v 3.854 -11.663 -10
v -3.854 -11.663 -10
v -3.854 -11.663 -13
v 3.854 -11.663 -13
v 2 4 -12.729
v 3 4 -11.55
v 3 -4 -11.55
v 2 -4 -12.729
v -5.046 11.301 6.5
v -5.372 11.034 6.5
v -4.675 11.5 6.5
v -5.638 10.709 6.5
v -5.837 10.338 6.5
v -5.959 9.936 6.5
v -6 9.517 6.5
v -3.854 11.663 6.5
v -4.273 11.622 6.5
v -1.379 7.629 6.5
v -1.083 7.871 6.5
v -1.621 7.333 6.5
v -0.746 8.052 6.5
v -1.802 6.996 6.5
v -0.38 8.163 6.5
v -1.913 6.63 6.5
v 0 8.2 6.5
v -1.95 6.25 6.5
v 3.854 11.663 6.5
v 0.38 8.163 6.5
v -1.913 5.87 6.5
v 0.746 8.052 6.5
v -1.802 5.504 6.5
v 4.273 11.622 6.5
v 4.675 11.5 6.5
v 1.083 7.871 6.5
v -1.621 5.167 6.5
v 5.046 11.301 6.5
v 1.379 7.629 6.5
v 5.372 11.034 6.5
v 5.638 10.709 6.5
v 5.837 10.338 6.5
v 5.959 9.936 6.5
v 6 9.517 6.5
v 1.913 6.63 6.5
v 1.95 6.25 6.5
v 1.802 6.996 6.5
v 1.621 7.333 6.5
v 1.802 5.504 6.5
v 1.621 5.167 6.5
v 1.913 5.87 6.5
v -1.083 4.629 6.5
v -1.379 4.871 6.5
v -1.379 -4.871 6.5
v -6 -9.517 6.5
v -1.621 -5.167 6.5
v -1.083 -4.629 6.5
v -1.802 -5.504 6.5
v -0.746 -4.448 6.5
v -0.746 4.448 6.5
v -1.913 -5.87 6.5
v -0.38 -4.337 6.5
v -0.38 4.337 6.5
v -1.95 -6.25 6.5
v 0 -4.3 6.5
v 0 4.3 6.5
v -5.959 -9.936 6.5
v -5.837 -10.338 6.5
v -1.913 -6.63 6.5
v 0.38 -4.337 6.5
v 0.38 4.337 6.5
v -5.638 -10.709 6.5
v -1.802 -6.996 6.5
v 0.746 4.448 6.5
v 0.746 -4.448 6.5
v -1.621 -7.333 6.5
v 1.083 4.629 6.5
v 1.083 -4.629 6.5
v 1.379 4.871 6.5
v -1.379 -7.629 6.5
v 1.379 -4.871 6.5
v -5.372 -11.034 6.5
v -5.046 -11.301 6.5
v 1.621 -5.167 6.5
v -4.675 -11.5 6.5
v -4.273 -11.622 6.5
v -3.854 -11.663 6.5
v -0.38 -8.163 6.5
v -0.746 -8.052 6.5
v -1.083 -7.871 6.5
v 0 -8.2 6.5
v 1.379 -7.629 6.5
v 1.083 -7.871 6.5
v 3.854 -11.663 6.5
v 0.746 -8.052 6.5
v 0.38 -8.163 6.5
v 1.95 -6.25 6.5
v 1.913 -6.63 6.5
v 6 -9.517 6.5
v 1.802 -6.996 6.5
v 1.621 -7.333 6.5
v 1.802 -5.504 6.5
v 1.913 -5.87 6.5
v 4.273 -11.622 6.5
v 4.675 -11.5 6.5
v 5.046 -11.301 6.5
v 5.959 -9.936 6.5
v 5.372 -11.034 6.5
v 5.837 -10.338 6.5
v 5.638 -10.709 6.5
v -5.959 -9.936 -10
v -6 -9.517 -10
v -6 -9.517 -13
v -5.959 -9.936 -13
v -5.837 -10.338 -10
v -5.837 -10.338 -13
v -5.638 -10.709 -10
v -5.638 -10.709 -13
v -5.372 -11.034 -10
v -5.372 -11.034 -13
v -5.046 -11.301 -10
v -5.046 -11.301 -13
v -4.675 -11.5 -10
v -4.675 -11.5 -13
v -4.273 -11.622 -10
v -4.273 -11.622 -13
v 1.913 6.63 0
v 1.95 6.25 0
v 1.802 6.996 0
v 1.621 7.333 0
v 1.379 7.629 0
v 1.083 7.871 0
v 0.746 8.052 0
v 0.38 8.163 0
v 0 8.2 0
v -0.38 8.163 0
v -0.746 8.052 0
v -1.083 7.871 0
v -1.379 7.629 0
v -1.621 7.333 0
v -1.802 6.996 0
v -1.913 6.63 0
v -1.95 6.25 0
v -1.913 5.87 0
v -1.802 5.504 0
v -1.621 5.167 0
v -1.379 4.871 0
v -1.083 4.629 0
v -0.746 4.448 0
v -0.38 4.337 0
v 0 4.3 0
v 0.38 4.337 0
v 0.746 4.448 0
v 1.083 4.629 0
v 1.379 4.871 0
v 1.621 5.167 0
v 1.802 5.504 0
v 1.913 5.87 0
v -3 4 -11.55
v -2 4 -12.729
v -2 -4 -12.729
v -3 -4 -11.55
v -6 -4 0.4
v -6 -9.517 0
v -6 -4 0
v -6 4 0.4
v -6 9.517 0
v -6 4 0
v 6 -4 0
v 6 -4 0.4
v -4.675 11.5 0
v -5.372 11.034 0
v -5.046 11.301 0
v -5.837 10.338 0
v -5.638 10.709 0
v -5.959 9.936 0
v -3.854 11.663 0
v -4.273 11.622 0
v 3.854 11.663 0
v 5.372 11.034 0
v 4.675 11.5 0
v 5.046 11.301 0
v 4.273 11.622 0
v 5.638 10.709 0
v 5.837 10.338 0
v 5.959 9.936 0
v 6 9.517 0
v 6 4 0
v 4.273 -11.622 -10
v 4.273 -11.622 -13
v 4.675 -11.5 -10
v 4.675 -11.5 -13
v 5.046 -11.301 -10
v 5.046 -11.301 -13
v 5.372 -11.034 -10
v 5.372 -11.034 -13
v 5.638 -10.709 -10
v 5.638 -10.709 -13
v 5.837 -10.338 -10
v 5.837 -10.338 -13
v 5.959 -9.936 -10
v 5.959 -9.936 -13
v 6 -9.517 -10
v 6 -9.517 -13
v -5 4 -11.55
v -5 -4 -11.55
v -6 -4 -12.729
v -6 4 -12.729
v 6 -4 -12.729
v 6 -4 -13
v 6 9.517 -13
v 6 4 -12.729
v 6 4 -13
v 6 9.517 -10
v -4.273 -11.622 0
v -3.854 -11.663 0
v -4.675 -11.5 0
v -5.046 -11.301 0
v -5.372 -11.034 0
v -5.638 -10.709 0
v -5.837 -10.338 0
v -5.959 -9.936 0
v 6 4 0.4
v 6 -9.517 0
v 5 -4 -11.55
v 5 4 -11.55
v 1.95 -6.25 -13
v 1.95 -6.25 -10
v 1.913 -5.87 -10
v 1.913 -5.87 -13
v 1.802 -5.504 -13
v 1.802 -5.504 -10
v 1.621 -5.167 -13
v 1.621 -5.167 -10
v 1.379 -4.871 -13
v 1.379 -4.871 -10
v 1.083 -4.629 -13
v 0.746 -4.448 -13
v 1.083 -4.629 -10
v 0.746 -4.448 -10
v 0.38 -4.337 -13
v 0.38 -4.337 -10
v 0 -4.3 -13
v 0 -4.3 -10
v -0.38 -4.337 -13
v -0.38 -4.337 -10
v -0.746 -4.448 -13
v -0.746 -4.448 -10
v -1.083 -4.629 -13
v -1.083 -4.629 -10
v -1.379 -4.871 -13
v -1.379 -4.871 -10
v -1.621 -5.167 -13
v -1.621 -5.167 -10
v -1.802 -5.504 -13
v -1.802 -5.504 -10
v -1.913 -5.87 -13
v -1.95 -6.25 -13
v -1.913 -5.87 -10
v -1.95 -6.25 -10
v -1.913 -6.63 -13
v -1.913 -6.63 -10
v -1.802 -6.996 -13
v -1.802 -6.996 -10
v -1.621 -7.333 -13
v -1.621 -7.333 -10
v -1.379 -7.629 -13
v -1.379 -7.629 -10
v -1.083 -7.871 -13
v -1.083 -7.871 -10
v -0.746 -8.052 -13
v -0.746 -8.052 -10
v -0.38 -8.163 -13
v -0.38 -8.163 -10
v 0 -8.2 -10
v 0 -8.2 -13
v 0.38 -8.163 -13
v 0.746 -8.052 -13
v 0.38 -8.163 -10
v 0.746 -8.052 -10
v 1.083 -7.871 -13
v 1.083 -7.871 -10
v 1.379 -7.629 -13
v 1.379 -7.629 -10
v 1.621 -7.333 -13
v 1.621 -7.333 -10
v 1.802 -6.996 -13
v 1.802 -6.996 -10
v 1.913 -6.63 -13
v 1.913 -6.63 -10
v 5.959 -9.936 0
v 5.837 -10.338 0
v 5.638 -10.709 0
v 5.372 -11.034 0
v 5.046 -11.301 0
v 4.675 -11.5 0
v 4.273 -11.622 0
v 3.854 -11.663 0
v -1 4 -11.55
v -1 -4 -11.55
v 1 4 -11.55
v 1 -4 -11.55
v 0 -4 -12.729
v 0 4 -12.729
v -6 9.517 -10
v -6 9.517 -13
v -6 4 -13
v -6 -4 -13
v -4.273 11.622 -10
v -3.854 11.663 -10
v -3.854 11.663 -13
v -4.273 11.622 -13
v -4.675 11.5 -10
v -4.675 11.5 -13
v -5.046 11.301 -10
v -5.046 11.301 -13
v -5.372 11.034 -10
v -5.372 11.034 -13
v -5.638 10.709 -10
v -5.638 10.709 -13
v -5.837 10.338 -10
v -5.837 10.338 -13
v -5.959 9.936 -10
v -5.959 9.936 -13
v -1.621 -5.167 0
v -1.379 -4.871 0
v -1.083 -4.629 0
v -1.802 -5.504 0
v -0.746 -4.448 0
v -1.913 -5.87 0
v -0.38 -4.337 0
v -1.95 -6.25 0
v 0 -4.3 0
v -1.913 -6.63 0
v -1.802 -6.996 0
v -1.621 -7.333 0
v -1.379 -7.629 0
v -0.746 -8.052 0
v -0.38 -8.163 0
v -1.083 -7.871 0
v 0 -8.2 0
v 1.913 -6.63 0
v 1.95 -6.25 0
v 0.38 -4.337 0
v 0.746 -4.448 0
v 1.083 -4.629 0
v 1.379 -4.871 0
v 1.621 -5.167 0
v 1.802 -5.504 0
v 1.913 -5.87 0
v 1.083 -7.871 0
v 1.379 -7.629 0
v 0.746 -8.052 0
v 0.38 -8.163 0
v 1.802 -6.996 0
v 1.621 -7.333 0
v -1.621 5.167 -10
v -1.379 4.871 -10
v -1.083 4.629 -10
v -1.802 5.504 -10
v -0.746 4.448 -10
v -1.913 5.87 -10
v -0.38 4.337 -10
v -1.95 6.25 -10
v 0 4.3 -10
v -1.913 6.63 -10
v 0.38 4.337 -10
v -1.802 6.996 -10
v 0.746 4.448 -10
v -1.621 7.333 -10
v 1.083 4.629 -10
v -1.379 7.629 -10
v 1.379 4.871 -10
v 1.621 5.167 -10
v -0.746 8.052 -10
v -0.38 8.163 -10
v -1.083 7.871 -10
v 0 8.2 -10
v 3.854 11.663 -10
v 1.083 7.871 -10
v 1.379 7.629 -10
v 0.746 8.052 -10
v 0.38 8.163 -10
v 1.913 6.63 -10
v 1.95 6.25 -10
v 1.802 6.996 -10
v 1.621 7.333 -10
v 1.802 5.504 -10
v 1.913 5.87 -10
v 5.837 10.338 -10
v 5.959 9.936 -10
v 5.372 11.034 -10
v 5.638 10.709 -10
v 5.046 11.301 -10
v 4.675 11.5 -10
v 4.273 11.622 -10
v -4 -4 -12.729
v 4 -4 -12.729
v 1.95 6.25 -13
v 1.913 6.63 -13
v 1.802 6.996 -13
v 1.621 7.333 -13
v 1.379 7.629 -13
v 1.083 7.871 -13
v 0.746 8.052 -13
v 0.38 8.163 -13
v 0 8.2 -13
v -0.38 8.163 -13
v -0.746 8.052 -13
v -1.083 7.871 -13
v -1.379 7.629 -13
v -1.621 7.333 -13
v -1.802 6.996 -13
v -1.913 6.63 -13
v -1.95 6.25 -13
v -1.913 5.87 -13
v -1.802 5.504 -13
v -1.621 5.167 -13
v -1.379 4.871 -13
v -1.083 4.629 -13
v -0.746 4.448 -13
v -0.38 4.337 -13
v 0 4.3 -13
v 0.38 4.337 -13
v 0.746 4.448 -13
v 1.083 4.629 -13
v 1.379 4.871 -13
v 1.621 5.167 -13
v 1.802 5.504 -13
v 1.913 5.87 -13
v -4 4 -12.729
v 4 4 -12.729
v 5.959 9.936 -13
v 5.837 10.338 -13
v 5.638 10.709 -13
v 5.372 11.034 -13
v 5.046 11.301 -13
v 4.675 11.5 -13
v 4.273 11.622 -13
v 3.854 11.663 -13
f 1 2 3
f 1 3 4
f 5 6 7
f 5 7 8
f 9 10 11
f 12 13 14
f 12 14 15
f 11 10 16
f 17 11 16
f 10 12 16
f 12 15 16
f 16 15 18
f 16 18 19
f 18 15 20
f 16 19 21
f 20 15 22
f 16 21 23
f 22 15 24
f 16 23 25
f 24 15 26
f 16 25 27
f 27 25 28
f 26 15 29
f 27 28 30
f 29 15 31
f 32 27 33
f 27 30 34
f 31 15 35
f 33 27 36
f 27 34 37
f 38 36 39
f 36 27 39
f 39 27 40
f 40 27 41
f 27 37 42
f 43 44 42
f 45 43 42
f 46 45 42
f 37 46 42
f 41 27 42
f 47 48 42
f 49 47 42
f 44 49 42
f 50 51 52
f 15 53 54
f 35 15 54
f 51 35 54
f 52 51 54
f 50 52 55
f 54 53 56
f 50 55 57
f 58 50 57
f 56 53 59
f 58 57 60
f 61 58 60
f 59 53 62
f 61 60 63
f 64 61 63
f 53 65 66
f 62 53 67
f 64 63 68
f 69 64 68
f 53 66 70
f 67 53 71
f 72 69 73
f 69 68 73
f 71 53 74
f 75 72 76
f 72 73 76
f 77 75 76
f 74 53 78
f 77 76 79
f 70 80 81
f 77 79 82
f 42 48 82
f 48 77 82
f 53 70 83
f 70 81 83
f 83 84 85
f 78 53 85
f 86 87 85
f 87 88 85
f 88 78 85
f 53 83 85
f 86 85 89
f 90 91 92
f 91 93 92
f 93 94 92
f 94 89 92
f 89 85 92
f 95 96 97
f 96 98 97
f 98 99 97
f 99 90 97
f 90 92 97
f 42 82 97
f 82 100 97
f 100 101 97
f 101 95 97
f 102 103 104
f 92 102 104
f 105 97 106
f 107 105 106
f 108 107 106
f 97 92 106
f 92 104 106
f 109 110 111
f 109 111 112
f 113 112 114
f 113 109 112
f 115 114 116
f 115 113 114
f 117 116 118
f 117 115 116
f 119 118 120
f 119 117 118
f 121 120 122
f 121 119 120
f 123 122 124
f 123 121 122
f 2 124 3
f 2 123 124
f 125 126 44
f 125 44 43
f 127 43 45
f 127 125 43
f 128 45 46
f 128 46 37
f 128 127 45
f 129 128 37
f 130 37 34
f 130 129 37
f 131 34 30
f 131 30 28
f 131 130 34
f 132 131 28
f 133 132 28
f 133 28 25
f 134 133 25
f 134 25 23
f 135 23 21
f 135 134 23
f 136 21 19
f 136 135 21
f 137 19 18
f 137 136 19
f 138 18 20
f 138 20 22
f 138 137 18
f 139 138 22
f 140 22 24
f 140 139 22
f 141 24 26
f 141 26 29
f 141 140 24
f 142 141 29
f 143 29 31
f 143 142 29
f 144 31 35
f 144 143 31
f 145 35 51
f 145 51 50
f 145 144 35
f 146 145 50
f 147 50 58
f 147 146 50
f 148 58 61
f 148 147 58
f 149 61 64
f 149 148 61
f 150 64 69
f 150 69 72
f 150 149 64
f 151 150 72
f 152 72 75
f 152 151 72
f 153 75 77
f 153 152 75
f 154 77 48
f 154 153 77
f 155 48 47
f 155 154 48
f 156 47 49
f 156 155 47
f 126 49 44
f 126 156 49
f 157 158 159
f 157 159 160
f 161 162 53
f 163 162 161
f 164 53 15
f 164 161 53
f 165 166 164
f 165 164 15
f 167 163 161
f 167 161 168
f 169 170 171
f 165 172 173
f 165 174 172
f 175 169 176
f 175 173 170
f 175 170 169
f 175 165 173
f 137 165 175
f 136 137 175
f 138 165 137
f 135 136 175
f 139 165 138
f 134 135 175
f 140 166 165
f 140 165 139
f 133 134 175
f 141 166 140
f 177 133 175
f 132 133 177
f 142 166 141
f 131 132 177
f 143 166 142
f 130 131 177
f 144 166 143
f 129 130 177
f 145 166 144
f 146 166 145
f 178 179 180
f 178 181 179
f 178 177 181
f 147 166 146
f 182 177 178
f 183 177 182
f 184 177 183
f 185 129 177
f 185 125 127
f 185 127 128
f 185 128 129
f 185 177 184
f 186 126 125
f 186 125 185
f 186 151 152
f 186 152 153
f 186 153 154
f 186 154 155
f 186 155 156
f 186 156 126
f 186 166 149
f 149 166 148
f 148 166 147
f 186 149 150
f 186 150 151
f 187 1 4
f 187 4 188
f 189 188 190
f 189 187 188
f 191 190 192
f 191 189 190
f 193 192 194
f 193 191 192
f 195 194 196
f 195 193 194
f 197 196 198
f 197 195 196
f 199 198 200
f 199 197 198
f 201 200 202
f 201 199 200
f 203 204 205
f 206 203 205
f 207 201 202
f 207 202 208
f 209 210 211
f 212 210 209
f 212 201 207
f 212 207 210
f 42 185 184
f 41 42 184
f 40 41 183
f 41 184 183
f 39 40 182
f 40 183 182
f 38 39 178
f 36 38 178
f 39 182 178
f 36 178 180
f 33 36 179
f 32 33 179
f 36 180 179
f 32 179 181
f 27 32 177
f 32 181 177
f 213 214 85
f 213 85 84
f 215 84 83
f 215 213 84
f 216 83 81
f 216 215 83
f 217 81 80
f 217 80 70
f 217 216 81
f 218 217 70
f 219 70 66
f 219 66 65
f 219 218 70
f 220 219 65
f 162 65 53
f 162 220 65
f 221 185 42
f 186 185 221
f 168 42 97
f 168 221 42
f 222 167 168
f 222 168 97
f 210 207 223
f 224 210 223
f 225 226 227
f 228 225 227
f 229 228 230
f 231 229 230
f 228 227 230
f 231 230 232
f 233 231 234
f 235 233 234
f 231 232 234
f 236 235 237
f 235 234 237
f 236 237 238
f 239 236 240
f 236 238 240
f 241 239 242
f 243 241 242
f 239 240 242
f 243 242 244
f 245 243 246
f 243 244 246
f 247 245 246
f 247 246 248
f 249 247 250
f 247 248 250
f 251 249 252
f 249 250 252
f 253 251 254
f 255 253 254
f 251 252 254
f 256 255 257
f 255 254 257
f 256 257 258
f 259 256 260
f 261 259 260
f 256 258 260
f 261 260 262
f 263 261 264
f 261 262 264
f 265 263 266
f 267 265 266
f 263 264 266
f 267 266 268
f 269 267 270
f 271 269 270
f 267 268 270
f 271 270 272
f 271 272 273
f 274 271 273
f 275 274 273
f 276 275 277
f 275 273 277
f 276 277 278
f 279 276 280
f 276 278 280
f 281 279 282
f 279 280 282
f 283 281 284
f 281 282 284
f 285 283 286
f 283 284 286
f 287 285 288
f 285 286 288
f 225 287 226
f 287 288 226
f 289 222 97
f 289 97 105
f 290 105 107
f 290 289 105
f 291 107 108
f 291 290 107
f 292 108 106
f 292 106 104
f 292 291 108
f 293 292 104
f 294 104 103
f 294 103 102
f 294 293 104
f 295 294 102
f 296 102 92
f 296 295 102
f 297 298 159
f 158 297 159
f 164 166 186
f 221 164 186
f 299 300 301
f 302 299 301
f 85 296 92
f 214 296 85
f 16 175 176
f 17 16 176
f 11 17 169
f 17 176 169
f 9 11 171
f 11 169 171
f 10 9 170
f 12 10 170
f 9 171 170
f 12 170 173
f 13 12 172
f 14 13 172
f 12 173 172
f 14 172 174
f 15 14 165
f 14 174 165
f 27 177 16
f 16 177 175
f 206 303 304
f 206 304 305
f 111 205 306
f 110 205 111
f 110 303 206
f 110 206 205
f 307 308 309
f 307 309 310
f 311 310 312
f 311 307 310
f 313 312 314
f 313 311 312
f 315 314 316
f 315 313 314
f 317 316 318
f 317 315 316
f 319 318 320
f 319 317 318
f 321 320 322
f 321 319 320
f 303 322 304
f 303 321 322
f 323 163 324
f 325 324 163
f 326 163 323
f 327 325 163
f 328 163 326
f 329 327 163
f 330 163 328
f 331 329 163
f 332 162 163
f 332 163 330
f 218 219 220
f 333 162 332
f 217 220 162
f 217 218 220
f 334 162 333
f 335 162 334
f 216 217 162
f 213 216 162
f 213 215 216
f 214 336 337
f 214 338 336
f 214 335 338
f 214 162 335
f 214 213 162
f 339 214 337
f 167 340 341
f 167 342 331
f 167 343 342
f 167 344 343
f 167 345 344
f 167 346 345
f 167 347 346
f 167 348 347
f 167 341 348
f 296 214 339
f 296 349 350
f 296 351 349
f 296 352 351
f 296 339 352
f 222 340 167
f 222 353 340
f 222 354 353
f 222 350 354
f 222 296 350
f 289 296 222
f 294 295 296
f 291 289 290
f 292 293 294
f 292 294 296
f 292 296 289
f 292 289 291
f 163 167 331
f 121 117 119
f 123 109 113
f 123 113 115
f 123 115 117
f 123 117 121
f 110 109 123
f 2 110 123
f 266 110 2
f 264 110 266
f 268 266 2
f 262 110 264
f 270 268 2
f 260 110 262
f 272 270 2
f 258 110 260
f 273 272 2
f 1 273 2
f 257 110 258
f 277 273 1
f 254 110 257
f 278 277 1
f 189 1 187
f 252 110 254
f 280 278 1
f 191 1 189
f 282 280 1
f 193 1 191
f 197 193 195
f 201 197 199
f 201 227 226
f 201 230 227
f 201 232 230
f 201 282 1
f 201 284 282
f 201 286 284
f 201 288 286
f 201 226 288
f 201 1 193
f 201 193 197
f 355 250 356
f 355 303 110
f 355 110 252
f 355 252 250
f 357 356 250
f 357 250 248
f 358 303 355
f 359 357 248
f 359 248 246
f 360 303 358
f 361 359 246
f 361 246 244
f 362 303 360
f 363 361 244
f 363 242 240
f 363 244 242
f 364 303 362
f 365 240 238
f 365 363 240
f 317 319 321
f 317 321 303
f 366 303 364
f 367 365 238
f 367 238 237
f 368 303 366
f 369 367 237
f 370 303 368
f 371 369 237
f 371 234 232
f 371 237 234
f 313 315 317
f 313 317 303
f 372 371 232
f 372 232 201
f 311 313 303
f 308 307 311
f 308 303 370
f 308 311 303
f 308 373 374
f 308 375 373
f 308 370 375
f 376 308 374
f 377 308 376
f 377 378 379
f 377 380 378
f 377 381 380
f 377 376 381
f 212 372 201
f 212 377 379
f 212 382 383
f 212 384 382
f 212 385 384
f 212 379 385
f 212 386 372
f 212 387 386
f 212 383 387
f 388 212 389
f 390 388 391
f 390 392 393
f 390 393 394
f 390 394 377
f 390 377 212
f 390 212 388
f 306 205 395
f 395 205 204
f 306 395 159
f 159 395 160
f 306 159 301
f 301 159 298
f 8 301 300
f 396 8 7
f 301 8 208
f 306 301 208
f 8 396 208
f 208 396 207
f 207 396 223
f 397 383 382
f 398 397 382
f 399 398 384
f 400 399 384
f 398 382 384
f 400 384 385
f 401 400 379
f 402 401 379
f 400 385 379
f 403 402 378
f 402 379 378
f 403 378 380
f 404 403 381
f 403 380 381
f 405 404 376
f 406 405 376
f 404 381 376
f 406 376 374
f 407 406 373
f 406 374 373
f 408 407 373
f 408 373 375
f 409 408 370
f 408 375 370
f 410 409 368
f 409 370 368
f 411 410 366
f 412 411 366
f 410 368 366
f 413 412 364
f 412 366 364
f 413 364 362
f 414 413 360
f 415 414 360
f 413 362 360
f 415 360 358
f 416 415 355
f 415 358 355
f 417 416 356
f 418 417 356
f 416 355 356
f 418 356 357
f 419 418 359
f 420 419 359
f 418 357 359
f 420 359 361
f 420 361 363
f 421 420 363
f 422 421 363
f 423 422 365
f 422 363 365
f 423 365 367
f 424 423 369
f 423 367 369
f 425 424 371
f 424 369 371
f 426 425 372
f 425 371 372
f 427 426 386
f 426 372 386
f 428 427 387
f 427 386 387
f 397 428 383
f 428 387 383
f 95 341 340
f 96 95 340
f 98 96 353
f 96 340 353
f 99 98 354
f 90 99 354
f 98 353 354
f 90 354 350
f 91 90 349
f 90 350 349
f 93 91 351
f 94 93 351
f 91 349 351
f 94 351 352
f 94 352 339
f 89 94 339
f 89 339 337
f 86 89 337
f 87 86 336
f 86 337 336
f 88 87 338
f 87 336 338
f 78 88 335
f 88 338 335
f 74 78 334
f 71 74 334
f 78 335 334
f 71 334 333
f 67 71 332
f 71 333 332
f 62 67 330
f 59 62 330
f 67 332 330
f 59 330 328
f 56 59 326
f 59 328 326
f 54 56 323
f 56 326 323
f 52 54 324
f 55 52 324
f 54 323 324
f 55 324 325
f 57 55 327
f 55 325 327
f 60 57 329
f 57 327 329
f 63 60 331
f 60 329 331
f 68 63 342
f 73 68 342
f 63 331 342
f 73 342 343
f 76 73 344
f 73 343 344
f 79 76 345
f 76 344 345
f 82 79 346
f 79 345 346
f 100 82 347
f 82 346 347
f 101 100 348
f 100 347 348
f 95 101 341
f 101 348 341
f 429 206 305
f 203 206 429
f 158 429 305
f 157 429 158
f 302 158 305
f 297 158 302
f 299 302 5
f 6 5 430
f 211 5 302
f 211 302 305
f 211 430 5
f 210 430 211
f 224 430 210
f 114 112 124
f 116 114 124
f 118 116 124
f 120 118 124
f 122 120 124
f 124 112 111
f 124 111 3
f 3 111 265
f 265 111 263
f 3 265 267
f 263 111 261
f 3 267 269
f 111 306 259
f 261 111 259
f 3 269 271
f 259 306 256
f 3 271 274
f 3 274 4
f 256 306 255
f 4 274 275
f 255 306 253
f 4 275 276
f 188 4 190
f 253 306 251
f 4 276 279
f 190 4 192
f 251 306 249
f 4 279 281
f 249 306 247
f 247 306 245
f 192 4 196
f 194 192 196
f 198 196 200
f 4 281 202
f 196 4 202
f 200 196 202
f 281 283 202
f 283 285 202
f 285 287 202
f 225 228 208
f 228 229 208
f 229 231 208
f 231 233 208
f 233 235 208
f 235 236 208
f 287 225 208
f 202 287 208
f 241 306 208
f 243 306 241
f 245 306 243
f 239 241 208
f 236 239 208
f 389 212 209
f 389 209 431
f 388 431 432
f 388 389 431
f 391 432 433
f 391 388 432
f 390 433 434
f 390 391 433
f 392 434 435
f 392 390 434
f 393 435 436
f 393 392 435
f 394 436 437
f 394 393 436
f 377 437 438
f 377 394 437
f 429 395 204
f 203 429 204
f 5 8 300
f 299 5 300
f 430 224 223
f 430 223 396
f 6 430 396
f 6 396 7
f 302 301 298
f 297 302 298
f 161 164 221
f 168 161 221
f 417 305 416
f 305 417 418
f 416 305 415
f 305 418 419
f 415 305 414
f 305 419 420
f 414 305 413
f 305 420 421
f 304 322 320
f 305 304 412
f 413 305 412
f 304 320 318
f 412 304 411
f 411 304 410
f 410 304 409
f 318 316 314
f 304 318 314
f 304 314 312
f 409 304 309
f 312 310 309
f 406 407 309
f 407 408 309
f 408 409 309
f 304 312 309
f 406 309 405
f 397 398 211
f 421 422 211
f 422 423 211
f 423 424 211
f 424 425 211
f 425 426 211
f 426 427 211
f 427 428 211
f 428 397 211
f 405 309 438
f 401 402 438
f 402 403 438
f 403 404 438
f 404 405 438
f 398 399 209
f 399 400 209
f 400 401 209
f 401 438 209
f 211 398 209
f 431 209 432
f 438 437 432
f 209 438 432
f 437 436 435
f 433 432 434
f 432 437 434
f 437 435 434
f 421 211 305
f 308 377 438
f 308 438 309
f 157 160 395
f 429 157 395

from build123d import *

# Parameters (mm, degrees)
F0_R          = 1.95
F1_DEPTH      = 6.5
F4_R          = 1.95
F5_DEPTH      = 3
F7_DEPTH      = 4
F7_DEPTH_BACK = 4
F8_W          = 12
F8_H          = 4
F9_DEPTH      = 0.4


with BuildPart() as f1:
    # F0 (on Top) → F1 (new body)
    with BuildSketch(Plane.XY):
        with BuildLine():
            Line((3.854228543, 11.6629619151), (-3.854228543, 11.6629619151))
            ThreePointArc((-3.854228543, 11.6629619151), (-5.3715180911, 11.0344800063), (-6, 9.5171904582))
            Line((-6, 9.5171904582), (-6, 0))
            Line((-6, 0), (6, 0))
            Line((6, 0), (6, 9.5171904582))
            ThreePointArc((6, 9.5171904582), (5.3715180911, 11.0344800063), (3.854228543, 11.6629619151))
        make_face()
        with Locations((0, 6.25)):
            Circle(F0_R, mode=Mode.SUBTRACT)
    extrude(amount=F1_DEPTH)

    # F2: F1 across plane


with BuildPart() as f1_1:
    add(f1.part)
    add(f1.part.mirror(Plane.XZ))

    # F8 (on Top) → F9 (cut)
    with BuildSketch(Plane.XY):
        with Locations((0, 2)):
            Rectangle(F8_W, F8_H)
        with Locations((0, -2)):
            Rectangle(F8_W, F8_H)
    extrude(amount=F9_DEPTH, mode=Mode.SUBTRACT)


with BuildPart() as f5:
    # F4 (on offset) → F5 (new body)
    with BuildSketch(Plane.XY.offset(-10)):
        with BuildLine():
            ThreePointArc((-3.854228543, 11.6629619151), (-5.3715180911, 11.0344800063), (-6, 9.5171904582))
            Line((-6, 9.5171904582), (-6, -9.5171904582))
            ThreePointArc((-6, -9.5171904582), (-5.3715180911, -11.0344800063), (-3.854228543, -11.6629619151))
            Line((-3.854228543, -11.6629619151), (3.854228543, -11.6629619151))
            ThreePointArc((3.854228543, -11.6629619151), (5.3715180911, -11.0344800063), (6, -9.5171904582))
            Line((6, -9.5171904582), (6, 9.5171904582))
            ThreePointArc((6, 9.5171904582), (5.3715180911, 11.0344800063), (3.854228543, 11.6629619151))
            Line((3.854228543, 11.6629619151), (-3.854228543, 11.6629619151))
        make_face()
        with Locations((0, -6.25)):
            Circle(F4_R, mode=Mode.SUBTRACT)
        with Locations((0, 6.25)):
            Circle(F4_R, mode=Mode.SUBTRACT)
    extrude(amount=-F5_DEPTH)

    # F6 (on Front) → F7 (cut, two sides)
    with BuildSketch(Plane.XZ) as f7_sk:
        Polygon((-6, -12.7287376672), (-6, -13), (-4, -13), (-4, -12.7287376672), (-5, -11.55), align=None)
        Polygon((-4, -12.7287376672), (-4, -13), (-2, -13), (-2, -12.7287376672), (-3, -11.55), align=None)
        Polygon((-2, -12.7287376672), (-2, -13), (0, -13), (0, -12.7287376672), (-1, -11.55), align=None)
        Polygon((0, -12.7287376672), (0, -13), (2, -13), (2, -12.7287376672), (1, -11.55), align=None)
        Polygon((2, -12.7287376672), (2, -13), (4, -13), (4, -12.7287376672), (3, -11.55), align=None)
        Polygon((4, -12.7287376672), (4, -13), (6, -13), (6, -12.7287376672), (5, -11.55), align=None)
    extrude(amount=-F7_DEPTH, mode=Mode.SUBTRACT)
    extrude(f7_sk.sketch, amount=F7_DEPTH_BACK, mode=Mode.SUBTRACT)


solid = Compound([f1_1.part, f5.part])
